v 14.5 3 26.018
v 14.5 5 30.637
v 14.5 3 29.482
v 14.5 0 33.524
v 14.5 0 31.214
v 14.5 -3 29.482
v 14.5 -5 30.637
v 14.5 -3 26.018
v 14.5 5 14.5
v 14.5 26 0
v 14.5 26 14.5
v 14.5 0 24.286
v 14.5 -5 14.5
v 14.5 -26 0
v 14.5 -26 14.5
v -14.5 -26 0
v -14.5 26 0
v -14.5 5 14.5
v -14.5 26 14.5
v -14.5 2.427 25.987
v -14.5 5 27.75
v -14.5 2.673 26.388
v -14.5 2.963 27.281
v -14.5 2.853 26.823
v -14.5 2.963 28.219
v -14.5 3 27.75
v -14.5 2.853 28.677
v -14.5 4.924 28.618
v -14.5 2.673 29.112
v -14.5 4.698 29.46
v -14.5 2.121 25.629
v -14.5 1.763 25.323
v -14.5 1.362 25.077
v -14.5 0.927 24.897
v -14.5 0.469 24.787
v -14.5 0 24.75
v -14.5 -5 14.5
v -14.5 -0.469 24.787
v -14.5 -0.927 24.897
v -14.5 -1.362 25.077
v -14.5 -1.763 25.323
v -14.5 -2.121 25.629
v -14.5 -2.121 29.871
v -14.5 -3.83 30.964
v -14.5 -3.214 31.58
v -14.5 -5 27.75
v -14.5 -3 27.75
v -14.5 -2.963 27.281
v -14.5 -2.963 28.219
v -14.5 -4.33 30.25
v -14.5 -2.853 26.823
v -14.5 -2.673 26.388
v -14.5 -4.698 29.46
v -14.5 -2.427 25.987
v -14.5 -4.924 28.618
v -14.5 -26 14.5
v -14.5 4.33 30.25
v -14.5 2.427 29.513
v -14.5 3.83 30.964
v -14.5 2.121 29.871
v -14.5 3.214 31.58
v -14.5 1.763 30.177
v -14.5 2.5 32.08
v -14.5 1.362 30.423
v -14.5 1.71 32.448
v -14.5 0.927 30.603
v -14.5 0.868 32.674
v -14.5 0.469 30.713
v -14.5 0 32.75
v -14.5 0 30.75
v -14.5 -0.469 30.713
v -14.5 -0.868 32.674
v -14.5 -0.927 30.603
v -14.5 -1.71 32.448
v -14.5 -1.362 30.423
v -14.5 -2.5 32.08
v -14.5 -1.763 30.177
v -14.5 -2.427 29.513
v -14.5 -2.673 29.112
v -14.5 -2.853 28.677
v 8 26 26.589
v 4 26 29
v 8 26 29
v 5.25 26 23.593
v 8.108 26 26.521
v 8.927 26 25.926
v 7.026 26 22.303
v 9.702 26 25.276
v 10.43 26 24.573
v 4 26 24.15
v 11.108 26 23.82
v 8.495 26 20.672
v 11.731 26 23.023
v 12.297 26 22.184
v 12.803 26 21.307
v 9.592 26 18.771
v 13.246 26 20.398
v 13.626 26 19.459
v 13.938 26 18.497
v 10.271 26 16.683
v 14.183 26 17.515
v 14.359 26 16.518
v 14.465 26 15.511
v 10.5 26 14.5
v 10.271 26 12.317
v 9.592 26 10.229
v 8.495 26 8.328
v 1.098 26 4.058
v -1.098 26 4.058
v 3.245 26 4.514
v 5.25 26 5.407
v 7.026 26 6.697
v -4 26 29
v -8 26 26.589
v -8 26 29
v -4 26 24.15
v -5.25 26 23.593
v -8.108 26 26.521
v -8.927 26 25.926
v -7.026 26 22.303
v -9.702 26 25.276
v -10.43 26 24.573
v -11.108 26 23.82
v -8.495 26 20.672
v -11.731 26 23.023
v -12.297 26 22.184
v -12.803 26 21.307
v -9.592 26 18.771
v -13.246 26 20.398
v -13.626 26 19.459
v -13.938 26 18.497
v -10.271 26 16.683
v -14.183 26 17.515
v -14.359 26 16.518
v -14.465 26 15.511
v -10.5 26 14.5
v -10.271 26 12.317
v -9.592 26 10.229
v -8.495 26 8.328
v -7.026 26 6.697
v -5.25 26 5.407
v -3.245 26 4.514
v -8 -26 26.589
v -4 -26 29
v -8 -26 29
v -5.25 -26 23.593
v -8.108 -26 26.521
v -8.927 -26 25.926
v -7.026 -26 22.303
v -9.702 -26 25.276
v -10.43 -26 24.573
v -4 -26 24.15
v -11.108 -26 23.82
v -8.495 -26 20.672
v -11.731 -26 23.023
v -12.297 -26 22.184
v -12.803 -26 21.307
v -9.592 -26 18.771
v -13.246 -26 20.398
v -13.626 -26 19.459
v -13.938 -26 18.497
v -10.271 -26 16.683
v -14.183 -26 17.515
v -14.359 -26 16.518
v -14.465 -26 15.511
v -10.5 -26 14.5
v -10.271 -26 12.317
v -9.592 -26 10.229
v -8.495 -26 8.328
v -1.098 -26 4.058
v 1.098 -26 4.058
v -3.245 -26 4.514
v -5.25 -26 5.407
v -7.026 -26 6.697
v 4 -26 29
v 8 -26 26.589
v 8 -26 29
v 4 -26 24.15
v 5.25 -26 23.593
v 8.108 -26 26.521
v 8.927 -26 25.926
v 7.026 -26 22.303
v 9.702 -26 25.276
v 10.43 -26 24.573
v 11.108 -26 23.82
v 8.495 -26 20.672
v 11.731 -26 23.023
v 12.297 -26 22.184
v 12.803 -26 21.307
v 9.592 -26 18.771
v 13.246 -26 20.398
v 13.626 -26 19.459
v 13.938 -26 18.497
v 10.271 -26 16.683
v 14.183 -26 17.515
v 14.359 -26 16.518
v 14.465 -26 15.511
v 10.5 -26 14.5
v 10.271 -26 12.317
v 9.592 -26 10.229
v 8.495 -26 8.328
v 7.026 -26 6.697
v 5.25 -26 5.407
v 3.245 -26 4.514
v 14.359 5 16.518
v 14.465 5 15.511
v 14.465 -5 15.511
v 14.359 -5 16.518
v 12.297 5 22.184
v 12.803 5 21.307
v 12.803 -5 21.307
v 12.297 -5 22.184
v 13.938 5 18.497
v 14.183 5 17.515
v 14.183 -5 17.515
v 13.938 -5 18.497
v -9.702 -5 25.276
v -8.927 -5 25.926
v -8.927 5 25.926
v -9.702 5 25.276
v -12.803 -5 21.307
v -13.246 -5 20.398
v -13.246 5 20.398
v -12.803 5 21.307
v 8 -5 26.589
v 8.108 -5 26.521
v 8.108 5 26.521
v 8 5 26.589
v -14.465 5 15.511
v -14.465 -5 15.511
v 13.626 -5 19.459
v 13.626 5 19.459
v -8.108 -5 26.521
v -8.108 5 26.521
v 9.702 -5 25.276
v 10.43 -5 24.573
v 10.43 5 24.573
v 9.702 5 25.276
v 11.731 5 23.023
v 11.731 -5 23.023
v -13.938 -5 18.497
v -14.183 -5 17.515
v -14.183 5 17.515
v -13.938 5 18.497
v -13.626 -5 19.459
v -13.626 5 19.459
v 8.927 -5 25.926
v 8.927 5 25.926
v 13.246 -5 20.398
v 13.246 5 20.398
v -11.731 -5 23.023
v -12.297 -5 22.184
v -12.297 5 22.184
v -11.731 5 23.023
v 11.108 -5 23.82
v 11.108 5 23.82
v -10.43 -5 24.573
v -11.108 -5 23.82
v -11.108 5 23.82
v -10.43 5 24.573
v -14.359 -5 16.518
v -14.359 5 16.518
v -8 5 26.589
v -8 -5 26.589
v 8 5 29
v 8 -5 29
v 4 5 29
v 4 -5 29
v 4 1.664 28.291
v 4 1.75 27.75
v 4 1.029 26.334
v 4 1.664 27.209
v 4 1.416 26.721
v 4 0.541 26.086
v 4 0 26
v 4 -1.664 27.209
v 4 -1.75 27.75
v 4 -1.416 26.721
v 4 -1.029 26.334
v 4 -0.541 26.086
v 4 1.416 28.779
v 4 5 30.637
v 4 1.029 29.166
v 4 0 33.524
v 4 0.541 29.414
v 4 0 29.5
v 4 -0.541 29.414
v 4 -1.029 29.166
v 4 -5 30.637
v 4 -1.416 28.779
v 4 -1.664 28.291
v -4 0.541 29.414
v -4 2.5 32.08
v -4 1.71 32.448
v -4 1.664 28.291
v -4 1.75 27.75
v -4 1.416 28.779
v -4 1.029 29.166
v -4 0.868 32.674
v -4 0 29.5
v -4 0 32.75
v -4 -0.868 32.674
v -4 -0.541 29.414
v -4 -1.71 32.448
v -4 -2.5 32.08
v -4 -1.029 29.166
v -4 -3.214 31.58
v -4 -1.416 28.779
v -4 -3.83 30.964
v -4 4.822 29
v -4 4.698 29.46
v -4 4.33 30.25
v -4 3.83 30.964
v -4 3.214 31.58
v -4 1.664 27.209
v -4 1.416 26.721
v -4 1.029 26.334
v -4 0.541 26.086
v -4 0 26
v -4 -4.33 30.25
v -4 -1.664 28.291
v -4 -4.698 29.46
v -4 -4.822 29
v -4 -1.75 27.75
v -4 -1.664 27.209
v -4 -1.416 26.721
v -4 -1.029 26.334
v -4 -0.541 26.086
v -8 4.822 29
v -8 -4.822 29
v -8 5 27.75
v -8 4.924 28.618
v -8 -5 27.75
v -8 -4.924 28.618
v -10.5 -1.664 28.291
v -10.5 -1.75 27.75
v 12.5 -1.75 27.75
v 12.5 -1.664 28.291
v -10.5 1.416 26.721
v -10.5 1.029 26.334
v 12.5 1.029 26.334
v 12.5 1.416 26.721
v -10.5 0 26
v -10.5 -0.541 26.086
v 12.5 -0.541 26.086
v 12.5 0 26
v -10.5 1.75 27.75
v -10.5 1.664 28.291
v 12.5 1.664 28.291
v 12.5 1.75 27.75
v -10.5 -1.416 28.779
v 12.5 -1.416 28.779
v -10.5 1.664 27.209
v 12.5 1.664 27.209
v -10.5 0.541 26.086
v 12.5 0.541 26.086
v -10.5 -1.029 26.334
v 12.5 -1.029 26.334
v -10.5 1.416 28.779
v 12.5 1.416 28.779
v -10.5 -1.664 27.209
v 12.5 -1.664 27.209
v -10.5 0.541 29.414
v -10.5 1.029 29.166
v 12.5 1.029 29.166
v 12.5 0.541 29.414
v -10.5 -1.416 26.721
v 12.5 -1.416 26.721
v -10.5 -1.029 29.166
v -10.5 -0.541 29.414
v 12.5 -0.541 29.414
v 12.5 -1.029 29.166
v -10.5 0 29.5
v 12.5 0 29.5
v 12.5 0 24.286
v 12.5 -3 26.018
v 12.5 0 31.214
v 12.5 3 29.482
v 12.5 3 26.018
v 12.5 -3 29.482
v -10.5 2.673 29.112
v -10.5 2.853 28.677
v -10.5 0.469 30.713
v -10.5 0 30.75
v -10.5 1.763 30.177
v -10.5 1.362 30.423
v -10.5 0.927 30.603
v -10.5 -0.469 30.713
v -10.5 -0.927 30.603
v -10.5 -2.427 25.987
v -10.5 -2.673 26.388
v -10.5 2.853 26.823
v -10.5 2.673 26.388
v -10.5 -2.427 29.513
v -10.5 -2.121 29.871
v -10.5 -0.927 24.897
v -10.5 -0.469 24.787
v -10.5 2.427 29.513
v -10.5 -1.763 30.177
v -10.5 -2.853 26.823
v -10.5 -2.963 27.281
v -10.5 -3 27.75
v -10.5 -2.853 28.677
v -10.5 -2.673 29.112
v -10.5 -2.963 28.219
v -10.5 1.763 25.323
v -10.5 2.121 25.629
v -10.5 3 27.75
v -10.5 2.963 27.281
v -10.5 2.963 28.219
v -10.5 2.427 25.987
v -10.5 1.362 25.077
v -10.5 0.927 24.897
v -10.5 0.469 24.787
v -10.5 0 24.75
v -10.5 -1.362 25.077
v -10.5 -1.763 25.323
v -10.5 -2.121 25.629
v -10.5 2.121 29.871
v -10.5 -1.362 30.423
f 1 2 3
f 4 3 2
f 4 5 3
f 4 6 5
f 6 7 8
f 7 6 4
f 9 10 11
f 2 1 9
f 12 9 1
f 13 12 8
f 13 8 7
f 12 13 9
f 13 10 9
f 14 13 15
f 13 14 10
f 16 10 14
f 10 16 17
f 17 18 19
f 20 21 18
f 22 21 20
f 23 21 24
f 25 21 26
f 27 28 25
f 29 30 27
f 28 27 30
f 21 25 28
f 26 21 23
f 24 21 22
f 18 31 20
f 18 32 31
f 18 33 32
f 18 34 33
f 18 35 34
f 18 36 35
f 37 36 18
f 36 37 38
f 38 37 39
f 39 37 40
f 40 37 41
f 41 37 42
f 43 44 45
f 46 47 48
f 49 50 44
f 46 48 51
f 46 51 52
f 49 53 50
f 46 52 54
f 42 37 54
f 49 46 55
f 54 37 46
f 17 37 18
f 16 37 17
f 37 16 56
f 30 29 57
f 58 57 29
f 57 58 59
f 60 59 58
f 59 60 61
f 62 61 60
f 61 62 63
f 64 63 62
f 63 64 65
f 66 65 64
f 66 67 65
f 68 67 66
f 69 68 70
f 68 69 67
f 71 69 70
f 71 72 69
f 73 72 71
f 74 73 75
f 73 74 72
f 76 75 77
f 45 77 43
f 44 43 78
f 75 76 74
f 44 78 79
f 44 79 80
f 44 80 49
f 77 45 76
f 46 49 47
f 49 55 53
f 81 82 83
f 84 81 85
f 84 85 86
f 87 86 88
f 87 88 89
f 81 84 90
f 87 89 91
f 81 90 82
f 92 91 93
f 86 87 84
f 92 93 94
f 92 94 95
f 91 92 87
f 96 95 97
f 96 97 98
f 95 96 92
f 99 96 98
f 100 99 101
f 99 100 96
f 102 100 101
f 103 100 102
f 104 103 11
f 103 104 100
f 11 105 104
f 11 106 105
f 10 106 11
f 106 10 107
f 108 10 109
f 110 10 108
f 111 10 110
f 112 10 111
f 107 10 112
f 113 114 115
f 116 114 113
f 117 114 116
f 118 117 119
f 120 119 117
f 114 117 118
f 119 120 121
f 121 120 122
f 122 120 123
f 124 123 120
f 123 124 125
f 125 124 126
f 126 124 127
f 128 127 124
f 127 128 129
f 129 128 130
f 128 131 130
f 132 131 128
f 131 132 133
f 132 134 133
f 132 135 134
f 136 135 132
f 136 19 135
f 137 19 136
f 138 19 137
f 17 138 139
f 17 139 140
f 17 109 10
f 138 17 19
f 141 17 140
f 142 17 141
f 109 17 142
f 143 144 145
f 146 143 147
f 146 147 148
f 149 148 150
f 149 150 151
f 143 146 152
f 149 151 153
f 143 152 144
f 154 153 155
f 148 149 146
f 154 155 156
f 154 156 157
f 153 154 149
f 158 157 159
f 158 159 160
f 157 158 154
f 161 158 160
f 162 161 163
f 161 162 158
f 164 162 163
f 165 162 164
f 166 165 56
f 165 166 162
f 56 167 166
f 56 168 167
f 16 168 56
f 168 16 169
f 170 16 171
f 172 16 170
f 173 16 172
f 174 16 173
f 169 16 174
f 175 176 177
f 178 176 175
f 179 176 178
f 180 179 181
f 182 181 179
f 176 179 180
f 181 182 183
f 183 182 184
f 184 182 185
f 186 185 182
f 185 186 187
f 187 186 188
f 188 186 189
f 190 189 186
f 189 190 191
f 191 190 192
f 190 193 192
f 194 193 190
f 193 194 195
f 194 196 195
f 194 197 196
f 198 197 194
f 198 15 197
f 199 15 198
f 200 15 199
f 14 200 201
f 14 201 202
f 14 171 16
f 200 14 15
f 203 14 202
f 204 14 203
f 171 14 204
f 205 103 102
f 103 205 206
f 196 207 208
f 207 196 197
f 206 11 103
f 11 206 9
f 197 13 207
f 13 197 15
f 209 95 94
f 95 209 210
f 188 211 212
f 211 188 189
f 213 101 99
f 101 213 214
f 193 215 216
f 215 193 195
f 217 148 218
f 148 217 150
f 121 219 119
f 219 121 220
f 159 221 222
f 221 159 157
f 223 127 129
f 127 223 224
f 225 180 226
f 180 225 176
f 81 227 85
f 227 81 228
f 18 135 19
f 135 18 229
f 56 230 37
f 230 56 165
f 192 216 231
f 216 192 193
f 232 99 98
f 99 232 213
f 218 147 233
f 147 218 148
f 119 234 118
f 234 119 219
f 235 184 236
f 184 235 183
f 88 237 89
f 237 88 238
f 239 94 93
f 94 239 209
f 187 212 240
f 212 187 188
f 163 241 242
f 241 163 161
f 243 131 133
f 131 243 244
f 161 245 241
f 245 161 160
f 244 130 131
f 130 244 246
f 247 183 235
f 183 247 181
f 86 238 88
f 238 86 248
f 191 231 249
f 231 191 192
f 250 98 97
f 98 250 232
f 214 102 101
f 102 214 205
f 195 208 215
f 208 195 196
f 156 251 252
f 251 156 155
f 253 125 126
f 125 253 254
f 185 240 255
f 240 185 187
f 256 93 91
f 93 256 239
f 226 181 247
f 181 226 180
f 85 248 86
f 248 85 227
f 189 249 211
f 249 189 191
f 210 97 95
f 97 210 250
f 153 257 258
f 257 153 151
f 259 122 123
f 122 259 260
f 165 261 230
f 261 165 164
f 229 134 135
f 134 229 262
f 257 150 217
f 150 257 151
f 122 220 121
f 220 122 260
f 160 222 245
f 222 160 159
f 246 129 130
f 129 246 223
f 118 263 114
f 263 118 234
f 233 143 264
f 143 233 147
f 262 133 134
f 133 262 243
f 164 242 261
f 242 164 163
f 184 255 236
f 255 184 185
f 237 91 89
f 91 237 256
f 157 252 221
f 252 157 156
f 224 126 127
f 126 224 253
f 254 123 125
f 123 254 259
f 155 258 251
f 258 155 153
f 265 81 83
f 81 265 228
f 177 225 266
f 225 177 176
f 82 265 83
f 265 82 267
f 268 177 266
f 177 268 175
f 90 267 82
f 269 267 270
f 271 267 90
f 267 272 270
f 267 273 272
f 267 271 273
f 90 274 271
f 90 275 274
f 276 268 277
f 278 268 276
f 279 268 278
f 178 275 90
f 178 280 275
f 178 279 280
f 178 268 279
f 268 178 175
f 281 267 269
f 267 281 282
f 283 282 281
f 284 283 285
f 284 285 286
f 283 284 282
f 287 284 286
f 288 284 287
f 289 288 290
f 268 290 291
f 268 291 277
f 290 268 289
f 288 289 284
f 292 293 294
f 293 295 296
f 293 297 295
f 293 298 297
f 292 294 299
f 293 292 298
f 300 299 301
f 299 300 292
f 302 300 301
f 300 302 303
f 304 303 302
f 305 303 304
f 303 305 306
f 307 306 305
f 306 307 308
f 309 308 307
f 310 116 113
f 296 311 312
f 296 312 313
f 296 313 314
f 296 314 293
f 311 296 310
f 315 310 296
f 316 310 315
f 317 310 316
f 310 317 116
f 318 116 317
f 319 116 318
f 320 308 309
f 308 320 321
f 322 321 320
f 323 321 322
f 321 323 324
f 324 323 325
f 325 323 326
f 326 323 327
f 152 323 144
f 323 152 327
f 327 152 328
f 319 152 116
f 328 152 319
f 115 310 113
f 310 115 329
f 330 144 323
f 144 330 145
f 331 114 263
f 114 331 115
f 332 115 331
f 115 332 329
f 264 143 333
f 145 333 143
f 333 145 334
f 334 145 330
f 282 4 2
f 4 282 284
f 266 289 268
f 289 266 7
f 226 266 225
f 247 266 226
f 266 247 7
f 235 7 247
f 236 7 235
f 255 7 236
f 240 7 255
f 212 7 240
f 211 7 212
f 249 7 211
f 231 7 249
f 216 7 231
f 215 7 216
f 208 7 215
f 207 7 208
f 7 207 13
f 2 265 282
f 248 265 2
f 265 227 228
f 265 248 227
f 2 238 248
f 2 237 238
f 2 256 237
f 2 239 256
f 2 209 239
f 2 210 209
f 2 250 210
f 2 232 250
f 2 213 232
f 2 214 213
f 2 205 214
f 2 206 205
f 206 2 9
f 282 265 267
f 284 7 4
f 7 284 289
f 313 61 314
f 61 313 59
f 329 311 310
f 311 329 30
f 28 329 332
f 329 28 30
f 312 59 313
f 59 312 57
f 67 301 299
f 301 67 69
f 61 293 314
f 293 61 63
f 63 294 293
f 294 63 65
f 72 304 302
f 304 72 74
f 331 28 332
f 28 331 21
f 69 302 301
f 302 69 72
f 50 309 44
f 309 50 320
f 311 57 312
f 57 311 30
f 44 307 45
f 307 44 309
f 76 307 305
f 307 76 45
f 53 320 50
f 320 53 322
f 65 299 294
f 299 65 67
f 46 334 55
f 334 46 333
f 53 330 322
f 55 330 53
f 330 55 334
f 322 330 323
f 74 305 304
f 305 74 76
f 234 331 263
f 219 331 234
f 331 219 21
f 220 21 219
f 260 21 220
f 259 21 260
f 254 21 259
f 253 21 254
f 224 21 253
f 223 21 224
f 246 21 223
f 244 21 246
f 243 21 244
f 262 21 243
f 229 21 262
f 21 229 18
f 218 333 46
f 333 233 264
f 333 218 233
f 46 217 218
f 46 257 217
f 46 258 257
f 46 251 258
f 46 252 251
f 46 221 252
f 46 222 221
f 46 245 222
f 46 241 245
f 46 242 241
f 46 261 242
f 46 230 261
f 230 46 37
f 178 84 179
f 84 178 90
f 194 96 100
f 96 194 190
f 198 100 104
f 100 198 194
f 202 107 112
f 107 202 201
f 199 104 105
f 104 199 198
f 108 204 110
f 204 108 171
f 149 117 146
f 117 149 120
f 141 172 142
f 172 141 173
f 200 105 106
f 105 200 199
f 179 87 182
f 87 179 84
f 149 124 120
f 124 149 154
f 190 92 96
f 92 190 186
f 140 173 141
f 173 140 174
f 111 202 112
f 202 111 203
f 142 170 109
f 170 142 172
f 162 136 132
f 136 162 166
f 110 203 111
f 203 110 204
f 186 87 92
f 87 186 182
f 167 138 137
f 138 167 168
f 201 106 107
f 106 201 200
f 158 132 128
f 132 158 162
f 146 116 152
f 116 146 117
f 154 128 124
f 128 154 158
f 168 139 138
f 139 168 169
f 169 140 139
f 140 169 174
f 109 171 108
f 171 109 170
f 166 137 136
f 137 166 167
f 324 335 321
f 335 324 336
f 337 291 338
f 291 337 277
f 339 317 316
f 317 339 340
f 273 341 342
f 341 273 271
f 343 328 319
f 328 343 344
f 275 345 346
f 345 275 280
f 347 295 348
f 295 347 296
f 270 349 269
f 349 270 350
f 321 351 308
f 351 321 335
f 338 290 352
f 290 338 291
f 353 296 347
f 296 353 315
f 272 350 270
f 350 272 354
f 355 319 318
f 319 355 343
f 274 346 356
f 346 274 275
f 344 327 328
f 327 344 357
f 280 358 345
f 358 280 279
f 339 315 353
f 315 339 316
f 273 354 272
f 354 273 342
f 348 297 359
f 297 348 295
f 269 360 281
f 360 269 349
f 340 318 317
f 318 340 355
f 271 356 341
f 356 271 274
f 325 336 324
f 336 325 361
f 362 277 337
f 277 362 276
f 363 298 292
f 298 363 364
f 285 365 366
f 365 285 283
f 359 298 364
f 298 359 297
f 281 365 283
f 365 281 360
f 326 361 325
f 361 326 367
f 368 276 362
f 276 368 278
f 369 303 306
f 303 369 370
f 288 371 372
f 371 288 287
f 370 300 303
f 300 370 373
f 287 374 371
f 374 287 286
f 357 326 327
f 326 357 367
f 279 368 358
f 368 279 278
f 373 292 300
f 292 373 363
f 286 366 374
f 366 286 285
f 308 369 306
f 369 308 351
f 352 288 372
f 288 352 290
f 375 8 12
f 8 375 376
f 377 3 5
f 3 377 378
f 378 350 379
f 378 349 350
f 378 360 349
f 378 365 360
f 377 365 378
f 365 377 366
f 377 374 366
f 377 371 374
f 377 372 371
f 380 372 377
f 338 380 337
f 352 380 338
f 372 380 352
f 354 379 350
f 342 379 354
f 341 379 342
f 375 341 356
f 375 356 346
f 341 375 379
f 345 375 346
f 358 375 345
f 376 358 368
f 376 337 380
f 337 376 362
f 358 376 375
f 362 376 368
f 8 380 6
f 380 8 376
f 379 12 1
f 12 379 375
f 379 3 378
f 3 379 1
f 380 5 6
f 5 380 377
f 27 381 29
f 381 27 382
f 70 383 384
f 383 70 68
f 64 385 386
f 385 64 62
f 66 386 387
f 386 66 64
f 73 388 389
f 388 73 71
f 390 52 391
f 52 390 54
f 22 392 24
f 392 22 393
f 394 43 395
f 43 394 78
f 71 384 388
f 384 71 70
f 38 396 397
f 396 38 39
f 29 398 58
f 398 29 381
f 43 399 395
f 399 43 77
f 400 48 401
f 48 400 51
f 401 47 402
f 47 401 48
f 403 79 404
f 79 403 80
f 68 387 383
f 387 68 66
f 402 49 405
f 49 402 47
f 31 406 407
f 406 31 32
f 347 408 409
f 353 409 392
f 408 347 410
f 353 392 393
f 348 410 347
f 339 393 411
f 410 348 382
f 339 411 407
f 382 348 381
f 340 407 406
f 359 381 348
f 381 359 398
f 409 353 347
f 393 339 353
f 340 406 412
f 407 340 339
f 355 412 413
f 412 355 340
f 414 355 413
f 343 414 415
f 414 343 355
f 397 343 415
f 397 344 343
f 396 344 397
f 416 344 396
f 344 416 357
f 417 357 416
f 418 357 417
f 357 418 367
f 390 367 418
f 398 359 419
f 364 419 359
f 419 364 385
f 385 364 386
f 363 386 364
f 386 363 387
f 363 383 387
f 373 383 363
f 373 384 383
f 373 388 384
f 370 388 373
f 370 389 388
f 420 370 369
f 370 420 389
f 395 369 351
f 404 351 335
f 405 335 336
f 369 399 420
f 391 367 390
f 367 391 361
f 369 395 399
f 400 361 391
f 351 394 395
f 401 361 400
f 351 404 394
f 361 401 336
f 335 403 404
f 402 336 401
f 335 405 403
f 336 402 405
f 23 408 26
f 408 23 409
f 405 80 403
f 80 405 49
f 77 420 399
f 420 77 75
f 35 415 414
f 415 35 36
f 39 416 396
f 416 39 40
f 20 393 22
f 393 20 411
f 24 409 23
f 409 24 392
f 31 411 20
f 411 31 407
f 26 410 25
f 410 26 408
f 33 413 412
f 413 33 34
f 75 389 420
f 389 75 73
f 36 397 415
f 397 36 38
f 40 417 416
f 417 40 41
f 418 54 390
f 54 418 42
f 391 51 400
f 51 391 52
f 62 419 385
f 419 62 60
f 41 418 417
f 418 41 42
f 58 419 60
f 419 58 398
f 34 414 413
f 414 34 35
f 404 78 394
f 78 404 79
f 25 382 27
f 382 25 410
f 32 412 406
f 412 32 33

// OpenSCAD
// TFZB holder
// *********************************************
// Marcin Lukasik <marcin@lukasik.name>
// http://marcin.name
// http://www.thingiverse.com/nothinman
// *********************************************
// derived from:
// http://www.thingiverse.com/thing:14942

// TFZB/rod dimensions
TFZB_dia = 21;
TFZB_length = 52;
rod_dia = 12;

//screw/nut dimensions (M3) - hexagon socket head cap screw ISO 4762, hexagon nut ISO 4032
screw_thread_dia_iso = 3;
screw_head_dia_iso = 5.5;
screw_head_height = 4;
nut_wrench_size_iso = 5.5;
nut_height = 2;

// screw/nut dimensions for use (plus clearance for fitting purpose)
clearance_dia = 0.5;
screw_thread_dia = screw_thread_dia_iso + clearance_dia;
screw_head_dia = screw_head_dia_iso + clearance_dia;
nut_wrench_size = nut_wrench_size_iso + clearance_dia;
nut_dia_perimeter = (nut_wrench_size/cos(30));
nut_dia = nut_dia_perimeter;
nut_surround_thickness = 2;

// main body dimensions
body_wall_thickness = 4;
body_width = TFZB_dia + (2*body_wall_thickness);
body_height = body_width;
body_length = TFZB_length;
//gap_width = rod_dia + 2;
gap_width = 8;
screw_bushing_space = 1;
screw_elevation = TFZB_dia + body_wall_thickness + (screw_thread_dia/2) + screw_bushing_space;

// TEST - uncomment to render in openscad:
bholder();		// WITH mountplate

module mount_plate()
{
	difference()
	{
		translate([0,0,1.5])
		cube([body_width+2*screw_head_dia+4*nut_surround_thickness,screw_head_dia+2*nut_surround_thickness,3], center=true);

		for(i=[-1,1])
			translate([i*(body_width/2+nut_surround_thickness+screw_head_dia/2),0,-0.5])
				cylinder(r=screw_thread_dia/2, h=4, $fn=20);
	}
}

// main body
module bholder(with_mountplate=false)
{
	difference()
	{
		union()
		{
			if (with_mountplate) {
                mount_plate();
            }
            
			// body
			translate([0,0,body_height/4])
				cube([body_width,body_length,body_height/2], center=true);
            
			translate([0,0,(TFZB_dia/2)+body_wall_thickness])		
				rotate([90,0,0])
					cylinder(r=(TFZB_dia/2)+body_wall_thickness, h=TFZB_length, center=true, $fn=90);

			// gap support
			translate([gap_width/2, -(body_length/2), body_height-((TFZB_dia/2)+screw_bushing_space+(screw_thread_dia/2))])
				cube([body_wall_thickness,TFZB_length,(TFZB_dia/2)+screw_bushing_space+(screw_thread_dia/2)]);
			translate([-(gap_width/2)-body_wall_thickness, -(body_length/2), body_height-((TFZB_dia/2)+screw_bushing_space+(screw_thread_dia/2))])
				cube([body_wall_thickness,TFZB_length,(TFZB_dia/2)+screw_bushing_space+(screw_thread_dia/2)]);
	
			// nut trap surround
			translate([gap_width/2,0,screw_elevation])
				rotate([0,90,0])
					cylinder(r=(((nut_wrench_size+nut_surround_thickness*2)/cos(30))/2), h=(body_width-gap_width)/2, $fn=6);
			translate([gap_width/2+(body_width-gap_width)/4,0,screw_elevation/2])
				cube([(body_width-gap_width)/2,nut_wrench_size+(nut_surround_thickness*2),screw_elevation],center=true);

			// Screw hole surround
			translate([-gap_width/2,0,screw_elevation])
				rotate([0,-90,0])
					cylinder(r=(screw_head_dia/2)+nut_surround_thickness, h=(body_width-gap_width)/2, $fn=36);
			translate([-(gap_width/2+(body_width-gap_width)/4),0,screw_elevation/2])
				cube([(body_width-gap_width)/2,screw_head_dia+(nut_surround_thickness*2),screw_elevation],center=true);

	}
/**/
		// bushing hole
		translate([0,0,TFZB_dia/2+body_wall_thickness])
			rotate([90,0,0])
				cylinder(r=TFZB_dia/2, h=TFZB_length+1, center=true);
/**/
		// top gap
		translate([-(gap_width/2),-(body_length/2)-1,body_height/2])
			cube([gap_width,TFZB_length+2,(TFZB_dia/2)+screw_bushing_space+(screw_thread_dia/2)+(nut_dia/2)+nut_surround_thickness+1]);
/**/	
		// screw hole (one all the way through)
		translate([0,0,screw_elevation])
			rotate([0,90,0])
				cylinder(r=screw_thread_dia/2, h=body_width+3, center=true, $fn=20);
/**/	
		// nut trap
		translate([body_width/2-nut_height, 0, screw_elevation])
			rotate([0,90,0])
				cylinder(r=nut_dia/2, h=body_width/2-gap_width/2-body_wall_thickness+1,$fn=6);
/**/	
		// screw head hole
		translate([-(body_width/2-screw_head_height), 0, screw_elevation])
			rotate([0,-90,0])
				cylinder(r=screw_head_dia/2, h=body_width/2-gap_width/2-body_wall_thickness+2,$fn=40);
/**/	
	}
}
